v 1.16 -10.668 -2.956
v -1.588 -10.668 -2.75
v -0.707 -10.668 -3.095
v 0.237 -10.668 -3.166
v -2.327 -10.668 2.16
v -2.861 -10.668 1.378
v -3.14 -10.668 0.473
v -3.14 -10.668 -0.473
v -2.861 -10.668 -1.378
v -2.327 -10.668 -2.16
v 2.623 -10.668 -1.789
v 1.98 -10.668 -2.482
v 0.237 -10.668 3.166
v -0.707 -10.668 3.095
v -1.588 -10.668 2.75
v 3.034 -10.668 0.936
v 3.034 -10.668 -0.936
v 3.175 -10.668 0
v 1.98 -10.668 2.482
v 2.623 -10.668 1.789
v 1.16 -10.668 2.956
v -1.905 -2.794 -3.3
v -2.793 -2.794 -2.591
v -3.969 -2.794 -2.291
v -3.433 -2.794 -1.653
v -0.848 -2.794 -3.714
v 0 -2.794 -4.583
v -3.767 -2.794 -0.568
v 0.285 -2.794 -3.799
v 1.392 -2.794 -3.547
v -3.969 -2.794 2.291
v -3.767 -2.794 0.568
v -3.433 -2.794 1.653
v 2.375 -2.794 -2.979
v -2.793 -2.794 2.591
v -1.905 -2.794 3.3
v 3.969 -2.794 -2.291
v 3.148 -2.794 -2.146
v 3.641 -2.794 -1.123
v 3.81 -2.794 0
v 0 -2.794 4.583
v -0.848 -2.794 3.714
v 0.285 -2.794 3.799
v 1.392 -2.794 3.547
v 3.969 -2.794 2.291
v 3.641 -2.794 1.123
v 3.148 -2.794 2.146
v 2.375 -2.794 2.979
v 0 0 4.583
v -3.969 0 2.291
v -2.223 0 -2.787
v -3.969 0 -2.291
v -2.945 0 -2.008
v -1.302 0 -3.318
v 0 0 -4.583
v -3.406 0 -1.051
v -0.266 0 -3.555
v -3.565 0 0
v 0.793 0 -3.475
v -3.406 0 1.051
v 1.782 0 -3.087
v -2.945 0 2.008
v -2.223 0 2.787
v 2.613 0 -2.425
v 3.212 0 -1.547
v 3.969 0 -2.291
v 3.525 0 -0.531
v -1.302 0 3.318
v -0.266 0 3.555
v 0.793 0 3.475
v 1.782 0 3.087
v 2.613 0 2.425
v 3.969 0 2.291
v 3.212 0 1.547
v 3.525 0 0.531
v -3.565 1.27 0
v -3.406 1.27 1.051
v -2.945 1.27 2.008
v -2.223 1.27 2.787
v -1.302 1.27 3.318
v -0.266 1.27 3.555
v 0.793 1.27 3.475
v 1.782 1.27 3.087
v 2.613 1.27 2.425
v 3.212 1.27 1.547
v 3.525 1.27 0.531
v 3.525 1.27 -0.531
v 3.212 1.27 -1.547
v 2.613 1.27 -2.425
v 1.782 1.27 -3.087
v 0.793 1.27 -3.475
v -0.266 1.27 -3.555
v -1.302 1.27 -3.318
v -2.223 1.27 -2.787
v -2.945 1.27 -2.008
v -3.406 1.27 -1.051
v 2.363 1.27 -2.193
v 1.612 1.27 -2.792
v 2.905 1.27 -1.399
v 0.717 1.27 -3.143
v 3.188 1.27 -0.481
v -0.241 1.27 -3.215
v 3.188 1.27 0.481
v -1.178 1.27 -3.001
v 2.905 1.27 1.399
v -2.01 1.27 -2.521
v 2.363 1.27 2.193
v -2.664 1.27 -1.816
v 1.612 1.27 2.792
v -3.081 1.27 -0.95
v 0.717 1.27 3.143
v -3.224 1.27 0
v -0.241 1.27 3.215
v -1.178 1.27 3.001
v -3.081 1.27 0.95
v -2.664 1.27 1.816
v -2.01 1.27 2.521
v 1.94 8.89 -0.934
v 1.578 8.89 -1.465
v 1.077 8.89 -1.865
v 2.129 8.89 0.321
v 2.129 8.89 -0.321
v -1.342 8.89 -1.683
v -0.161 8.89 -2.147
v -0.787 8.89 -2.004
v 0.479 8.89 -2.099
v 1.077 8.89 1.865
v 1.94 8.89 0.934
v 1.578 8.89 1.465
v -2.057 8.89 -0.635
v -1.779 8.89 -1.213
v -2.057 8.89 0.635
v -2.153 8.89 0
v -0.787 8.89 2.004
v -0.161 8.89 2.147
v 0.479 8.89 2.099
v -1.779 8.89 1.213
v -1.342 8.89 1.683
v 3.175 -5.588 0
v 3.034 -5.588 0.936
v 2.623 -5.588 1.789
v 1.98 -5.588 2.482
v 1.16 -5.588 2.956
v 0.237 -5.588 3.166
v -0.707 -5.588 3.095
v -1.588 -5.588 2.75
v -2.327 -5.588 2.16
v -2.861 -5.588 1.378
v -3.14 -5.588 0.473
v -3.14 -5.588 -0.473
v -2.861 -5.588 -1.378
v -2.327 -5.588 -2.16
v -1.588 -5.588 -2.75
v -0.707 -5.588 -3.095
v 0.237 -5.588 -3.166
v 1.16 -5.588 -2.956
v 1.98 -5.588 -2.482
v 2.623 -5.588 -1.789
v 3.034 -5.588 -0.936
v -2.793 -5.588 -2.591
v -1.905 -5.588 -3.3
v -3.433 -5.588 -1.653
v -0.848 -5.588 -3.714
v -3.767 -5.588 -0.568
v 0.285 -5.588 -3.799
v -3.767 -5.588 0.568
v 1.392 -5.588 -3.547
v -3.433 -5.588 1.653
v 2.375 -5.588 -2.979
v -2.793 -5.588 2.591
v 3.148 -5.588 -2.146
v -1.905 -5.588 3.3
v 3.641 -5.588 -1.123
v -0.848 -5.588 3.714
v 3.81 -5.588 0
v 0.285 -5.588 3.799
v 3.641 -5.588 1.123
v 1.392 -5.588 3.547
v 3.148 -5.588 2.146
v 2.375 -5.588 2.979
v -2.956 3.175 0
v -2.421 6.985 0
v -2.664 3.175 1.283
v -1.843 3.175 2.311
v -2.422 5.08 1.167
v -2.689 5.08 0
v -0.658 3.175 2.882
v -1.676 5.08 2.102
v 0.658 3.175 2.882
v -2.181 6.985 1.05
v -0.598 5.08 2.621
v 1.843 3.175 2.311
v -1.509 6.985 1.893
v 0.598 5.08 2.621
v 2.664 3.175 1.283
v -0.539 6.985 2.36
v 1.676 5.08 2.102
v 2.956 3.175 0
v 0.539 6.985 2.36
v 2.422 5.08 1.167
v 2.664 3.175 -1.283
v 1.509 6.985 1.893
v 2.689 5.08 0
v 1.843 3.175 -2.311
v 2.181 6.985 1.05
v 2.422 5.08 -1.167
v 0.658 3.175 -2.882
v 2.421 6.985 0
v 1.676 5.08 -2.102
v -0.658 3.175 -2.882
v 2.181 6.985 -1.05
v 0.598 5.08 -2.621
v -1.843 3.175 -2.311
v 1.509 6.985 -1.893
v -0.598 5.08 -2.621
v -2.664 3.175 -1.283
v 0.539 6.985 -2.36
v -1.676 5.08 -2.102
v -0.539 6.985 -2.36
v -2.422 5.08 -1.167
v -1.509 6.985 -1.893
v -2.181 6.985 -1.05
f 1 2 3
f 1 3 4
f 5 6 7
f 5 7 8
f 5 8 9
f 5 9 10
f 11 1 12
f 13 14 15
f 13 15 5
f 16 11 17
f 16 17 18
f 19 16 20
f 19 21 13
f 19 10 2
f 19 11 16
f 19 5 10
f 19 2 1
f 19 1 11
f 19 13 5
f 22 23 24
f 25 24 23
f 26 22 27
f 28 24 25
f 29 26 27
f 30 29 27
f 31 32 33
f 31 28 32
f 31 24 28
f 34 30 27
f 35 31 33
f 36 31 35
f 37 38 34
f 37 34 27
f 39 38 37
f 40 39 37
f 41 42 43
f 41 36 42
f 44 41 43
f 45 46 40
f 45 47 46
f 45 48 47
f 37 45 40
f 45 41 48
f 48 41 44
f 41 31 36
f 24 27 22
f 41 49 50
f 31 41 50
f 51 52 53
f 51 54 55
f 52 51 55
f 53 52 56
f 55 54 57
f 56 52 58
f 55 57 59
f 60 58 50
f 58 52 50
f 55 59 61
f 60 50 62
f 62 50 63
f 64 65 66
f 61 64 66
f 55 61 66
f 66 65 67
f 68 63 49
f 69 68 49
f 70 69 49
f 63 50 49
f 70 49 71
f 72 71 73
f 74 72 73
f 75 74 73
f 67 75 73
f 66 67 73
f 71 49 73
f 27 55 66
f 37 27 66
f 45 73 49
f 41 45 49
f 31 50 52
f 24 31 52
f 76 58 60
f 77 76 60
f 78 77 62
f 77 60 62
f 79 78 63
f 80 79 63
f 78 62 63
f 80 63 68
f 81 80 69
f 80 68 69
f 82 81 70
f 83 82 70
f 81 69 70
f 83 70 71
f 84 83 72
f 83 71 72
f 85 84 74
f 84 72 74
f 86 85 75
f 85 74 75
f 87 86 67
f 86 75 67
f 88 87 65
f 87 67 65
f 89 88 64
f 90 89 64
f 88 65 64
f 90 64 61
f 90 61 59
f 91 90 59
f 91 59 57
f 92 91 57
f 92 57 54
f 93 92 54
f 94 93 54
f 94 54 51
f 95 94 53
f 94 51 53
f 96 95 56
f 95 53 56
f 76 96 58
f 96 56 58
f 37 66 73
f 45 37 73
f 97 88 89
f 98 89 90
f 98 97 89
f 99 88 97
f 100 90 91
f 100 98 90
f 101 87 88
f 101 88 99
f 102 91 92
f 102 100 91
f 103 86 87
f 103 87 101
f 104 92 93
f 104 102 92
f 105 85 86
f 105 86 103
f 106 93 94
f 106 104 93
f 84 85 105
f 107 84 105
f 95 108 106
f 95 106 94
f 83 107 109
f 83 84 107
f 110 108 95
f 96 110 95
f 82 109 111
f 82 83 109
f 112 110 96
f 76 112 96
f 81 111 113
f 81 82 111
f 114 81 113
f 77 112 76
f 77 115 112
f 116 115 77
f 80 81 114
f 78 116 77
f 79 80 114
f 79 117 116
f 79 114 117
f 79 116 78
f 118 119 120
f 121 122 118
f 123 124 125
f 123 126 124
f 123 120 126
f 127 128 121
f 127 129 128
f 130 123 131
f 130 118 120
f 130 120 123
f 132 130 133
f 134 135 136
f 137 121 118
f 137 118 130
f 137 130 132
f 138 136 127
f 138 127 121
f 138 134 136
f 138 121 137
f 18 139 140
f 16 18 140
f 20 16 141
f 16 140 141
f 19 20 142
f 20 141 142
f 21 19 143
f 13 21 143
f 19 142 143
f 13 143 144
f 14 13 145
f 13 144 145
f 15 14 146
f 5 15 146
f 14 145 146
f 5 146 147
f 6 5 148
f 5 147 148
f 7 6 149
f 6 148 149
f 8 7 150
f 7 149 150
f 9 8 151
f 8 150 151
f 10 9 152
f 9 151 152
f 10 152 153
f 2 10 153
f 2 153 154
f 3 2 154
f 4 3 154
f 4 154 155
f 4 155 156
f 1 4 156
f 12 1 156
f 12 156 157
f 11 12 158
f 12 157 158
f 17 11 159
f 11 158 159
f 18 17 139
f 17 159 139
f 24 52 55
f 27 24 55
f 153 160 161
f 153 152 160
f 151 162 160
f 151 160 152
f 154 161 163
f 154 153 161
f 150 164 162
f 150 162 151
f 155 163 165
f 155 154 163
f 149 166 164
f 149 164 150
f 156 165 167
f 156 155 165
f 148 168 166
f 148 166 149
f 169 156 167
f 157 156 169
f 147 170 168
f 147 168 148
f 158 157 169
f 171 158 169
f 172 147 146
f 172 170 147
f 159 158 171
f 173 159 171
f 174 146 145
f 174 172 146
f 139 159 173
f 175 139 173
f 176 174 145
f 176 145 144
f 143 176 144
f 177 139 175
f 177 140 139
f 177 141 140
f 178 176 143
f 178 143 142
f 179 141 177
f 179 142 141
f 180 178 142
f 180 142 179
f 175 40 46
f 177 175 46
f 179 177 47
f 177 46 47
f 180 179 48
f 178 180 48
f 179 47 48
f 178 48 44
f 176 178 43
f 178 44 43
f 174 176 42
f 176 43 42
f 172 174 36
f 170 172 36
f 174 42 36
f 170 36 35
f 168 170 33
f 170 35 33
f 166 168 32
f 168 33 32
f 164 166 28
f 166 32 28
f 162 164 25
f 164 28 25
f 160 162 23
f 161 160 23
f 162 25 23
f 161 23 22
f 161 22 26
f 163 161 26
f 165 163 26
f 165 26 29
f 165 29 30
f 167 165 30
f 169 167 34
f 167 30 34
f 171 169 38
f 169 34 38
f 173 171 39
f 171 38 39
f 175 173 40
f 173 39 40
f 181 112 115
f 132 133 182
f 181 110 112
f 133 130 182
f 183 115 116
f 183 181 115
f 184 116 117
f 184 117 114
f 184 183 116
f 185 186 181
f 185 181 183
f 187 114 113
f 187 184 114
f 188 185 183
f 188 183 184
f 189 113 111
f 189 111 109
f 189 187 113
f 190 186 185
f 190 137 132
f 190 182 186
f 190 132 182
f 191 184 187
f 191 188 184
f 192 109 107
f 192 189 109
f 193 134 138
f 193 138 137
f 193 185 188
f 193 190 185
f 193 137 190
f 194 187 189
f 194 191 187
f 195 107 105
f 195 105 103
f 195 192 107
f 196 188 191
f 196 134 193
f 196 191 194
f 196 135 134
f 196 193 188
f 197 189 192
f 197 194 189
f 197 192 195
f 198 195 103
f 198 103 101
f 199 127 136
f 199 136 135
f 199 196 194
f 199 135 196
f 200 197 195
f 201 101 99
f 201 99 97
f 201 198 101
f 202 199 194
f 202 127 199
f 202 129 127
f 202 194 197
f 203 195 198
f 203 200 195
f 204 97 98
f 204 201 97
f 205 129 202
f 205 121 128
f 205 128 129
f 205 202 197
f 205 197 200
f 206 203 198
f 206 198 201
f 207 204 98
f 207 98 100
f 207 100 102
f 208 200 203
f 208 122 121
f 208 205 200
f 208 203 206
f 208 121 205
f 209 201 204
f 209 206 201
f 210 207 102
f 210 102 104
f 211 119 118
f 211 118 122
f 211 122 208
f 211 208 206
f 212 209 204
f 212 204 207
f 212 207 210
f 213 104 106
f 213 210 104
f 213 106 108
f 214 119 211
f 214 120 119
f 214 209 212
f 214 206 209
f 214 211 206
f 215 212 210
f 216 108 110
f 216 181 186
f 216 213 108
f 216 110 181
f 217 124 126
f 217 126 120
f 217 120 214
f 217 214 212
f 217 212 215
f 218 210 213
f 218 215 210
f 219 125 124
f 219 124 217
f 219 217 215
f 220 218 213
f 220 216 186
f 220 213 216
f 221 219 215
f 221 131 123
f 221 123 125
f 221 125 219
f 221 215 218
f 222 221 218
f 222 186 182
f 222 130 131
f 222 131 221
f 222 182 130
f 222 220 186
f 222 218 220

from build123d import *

# Parameters (mm, degrees)
F1_DEPTH = 2.794
F2_R     = 3.81
F3_DEPTH = 2.794
F4_R     = 3.175
F5_DEPTH = 5.08
F6_R     = 3.5648567011
F7_DEPTH = 1.27
F8_R     = 3.2240766962
F9_DEPTH = 7.62
F9_TAPER = 8


with BuildPart() as f1:
    # F0 (on Front) → F1 (new body)
    with BuildSketch(Plane.XZ):
        Polygon((3.96875, -2.2913588808), (3.96875, 2.2913588808), (0, 4.5827177617), (-3.96875, 2.2913588808), (-3.96875, -2.2913588808), (0, -4.5827177617), align=None)
    extrude(amount=F1_DEPTH)

    # F2 (on face) → F3 (join)
    with BuildSketch(Plane.XZ.offset(2.794)):
        Circle(F2_R)
    extrude(amount=F3_DEPTH)

    # F4 (on face) → F5 (join)
    with BuildSketch(Plane.XZ.offset(5.588)):
        Circle(F4_R)
    extrude(amount=F5_DEPTH)

    # F6 (on face) → F7 (join)
    with BuildSketch(Plane(origin=(0, 0, 0), x_dir=(-1, 0, 0), z_dir=(0, 1, 0))):
        Circle(F6_R)
    extrude(amount=F7_DEPTH)

    # F8 (on face) → F9 (join)
    with BuildSketch(Plane(origin=(0, 1.27, 0), x_dir=(-1, 0, 0), z_dir=(0, 1, 0))):
        Circle(F8_R)
    extrude(amount=F9_DEPTH, taper=F9_TAPER)


solid = f1.part
